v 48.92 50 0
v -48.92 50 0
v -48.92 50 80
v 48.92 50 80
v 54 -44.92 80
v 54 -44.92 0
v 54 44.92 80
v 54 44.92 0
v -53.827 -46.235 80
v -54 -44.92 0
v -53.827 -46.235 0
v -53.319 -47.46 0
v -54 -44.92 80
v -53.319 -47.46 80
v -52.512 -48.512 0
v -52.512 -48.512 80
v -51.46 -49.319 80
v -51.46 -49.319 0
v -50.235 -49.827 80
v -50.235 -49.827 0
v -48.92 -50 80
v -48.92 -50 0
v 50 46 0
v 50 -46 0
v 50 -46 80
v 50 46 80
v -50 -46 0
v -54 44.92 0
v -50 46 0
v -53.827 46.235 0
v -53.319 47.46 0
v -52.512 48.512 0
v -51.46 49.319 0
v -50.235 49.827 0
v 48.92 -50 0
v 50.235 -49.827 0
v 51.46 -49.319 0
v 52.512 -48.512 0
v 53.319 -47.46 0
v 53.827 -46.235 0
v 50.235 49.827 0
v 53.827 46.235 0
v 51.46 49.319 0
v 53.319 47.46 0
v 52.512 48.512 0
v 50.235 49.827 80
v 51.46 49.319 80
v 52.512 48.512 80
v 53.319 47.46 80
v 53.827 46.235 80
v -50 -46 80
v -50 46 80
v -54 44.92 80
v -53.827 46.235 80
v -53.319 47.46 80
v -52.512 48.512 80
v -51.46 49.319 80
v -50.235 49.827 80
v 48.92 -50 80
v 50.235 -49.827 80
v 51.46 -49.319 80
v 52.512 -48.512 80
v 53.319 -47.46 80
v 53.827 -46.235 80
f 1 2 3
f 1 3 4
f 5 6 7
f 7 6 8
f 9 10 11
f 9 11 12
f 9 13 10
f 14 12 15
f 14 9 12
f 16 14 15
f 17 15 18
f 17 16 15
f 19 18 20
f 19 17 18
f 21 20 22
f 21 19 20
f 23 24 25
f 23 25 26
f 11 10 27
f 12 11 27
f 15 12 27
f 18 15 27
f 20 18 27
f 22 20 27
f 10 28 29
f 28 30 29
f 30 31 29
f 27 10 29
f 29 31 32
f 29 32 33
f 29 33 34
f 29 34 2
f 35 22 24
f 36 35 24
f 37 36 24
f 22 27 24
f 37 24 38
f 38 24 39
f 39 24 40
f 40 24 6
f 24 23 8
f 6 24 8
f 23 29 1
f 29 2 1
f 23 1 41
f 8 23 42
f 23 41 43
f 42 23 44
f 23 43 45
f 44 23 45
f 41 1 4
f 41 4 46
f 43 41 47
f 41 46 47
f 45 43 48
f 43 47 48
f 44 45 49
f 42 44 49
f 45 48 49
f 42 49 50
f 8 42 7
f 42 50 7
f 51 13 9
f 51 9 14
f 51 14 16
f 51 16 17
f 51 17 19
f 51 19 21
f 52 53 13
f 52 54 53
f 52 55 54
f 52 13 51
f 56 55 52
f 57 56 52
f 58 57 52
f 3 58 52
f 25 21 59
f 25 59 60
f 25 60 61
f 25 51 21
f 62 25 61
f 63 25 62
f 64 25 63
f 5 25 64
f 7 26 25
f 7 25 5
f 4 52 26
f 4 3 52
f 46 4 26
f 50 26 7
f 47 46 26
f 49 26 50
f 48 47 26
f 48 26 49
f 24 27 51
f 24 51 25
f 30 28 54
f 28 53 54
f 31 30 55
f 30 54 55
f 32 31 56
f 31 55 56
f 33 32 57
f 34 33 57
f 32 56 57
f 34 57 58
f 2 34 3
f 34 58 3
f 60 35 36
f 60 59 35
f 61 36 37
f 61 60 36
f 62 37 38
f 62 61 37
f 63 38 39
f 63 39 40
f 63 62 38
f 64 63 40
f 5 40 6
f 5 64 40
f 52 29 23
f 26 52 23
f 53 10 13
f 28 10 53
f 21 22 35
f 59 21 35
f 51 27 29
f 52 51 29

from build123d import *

# Parameters (mm, degrees)
F0_W     = 108
F0_H     = 100
F0_W_2   = 100
F0_H_2   = 92
F1_DEPTH = 80
F2_R     = 5.08
F3_R     = 5.08


with BuildPart() as f1:
    # F0 (on Top) → F1 (new body)
    with BuildSketch(Plane.XY):
        Rectangle(F0_W, F0_H)
        Rectangle(F0_W_2, F0_H_2, mode=Mode.SUBTRACT)
    extrude(amount=F1_DEPTH)

    # F2
    f2_edges = [f1.edges().sort_by_distance(p)[0] for p in [
        (-54, -50, 40),
    ]]
    fillet(f2_edges, radius=F2_R)

    # F3
    f3_edges = [f1.edges().sort_by_distance(p)[0] for p in [
        (54, -50, 40),
        (54, 50, 40),
        (-54, 50, 40),
    ]]
    fillet(f3_edges, radius=F3_R)


solid = f1.part
